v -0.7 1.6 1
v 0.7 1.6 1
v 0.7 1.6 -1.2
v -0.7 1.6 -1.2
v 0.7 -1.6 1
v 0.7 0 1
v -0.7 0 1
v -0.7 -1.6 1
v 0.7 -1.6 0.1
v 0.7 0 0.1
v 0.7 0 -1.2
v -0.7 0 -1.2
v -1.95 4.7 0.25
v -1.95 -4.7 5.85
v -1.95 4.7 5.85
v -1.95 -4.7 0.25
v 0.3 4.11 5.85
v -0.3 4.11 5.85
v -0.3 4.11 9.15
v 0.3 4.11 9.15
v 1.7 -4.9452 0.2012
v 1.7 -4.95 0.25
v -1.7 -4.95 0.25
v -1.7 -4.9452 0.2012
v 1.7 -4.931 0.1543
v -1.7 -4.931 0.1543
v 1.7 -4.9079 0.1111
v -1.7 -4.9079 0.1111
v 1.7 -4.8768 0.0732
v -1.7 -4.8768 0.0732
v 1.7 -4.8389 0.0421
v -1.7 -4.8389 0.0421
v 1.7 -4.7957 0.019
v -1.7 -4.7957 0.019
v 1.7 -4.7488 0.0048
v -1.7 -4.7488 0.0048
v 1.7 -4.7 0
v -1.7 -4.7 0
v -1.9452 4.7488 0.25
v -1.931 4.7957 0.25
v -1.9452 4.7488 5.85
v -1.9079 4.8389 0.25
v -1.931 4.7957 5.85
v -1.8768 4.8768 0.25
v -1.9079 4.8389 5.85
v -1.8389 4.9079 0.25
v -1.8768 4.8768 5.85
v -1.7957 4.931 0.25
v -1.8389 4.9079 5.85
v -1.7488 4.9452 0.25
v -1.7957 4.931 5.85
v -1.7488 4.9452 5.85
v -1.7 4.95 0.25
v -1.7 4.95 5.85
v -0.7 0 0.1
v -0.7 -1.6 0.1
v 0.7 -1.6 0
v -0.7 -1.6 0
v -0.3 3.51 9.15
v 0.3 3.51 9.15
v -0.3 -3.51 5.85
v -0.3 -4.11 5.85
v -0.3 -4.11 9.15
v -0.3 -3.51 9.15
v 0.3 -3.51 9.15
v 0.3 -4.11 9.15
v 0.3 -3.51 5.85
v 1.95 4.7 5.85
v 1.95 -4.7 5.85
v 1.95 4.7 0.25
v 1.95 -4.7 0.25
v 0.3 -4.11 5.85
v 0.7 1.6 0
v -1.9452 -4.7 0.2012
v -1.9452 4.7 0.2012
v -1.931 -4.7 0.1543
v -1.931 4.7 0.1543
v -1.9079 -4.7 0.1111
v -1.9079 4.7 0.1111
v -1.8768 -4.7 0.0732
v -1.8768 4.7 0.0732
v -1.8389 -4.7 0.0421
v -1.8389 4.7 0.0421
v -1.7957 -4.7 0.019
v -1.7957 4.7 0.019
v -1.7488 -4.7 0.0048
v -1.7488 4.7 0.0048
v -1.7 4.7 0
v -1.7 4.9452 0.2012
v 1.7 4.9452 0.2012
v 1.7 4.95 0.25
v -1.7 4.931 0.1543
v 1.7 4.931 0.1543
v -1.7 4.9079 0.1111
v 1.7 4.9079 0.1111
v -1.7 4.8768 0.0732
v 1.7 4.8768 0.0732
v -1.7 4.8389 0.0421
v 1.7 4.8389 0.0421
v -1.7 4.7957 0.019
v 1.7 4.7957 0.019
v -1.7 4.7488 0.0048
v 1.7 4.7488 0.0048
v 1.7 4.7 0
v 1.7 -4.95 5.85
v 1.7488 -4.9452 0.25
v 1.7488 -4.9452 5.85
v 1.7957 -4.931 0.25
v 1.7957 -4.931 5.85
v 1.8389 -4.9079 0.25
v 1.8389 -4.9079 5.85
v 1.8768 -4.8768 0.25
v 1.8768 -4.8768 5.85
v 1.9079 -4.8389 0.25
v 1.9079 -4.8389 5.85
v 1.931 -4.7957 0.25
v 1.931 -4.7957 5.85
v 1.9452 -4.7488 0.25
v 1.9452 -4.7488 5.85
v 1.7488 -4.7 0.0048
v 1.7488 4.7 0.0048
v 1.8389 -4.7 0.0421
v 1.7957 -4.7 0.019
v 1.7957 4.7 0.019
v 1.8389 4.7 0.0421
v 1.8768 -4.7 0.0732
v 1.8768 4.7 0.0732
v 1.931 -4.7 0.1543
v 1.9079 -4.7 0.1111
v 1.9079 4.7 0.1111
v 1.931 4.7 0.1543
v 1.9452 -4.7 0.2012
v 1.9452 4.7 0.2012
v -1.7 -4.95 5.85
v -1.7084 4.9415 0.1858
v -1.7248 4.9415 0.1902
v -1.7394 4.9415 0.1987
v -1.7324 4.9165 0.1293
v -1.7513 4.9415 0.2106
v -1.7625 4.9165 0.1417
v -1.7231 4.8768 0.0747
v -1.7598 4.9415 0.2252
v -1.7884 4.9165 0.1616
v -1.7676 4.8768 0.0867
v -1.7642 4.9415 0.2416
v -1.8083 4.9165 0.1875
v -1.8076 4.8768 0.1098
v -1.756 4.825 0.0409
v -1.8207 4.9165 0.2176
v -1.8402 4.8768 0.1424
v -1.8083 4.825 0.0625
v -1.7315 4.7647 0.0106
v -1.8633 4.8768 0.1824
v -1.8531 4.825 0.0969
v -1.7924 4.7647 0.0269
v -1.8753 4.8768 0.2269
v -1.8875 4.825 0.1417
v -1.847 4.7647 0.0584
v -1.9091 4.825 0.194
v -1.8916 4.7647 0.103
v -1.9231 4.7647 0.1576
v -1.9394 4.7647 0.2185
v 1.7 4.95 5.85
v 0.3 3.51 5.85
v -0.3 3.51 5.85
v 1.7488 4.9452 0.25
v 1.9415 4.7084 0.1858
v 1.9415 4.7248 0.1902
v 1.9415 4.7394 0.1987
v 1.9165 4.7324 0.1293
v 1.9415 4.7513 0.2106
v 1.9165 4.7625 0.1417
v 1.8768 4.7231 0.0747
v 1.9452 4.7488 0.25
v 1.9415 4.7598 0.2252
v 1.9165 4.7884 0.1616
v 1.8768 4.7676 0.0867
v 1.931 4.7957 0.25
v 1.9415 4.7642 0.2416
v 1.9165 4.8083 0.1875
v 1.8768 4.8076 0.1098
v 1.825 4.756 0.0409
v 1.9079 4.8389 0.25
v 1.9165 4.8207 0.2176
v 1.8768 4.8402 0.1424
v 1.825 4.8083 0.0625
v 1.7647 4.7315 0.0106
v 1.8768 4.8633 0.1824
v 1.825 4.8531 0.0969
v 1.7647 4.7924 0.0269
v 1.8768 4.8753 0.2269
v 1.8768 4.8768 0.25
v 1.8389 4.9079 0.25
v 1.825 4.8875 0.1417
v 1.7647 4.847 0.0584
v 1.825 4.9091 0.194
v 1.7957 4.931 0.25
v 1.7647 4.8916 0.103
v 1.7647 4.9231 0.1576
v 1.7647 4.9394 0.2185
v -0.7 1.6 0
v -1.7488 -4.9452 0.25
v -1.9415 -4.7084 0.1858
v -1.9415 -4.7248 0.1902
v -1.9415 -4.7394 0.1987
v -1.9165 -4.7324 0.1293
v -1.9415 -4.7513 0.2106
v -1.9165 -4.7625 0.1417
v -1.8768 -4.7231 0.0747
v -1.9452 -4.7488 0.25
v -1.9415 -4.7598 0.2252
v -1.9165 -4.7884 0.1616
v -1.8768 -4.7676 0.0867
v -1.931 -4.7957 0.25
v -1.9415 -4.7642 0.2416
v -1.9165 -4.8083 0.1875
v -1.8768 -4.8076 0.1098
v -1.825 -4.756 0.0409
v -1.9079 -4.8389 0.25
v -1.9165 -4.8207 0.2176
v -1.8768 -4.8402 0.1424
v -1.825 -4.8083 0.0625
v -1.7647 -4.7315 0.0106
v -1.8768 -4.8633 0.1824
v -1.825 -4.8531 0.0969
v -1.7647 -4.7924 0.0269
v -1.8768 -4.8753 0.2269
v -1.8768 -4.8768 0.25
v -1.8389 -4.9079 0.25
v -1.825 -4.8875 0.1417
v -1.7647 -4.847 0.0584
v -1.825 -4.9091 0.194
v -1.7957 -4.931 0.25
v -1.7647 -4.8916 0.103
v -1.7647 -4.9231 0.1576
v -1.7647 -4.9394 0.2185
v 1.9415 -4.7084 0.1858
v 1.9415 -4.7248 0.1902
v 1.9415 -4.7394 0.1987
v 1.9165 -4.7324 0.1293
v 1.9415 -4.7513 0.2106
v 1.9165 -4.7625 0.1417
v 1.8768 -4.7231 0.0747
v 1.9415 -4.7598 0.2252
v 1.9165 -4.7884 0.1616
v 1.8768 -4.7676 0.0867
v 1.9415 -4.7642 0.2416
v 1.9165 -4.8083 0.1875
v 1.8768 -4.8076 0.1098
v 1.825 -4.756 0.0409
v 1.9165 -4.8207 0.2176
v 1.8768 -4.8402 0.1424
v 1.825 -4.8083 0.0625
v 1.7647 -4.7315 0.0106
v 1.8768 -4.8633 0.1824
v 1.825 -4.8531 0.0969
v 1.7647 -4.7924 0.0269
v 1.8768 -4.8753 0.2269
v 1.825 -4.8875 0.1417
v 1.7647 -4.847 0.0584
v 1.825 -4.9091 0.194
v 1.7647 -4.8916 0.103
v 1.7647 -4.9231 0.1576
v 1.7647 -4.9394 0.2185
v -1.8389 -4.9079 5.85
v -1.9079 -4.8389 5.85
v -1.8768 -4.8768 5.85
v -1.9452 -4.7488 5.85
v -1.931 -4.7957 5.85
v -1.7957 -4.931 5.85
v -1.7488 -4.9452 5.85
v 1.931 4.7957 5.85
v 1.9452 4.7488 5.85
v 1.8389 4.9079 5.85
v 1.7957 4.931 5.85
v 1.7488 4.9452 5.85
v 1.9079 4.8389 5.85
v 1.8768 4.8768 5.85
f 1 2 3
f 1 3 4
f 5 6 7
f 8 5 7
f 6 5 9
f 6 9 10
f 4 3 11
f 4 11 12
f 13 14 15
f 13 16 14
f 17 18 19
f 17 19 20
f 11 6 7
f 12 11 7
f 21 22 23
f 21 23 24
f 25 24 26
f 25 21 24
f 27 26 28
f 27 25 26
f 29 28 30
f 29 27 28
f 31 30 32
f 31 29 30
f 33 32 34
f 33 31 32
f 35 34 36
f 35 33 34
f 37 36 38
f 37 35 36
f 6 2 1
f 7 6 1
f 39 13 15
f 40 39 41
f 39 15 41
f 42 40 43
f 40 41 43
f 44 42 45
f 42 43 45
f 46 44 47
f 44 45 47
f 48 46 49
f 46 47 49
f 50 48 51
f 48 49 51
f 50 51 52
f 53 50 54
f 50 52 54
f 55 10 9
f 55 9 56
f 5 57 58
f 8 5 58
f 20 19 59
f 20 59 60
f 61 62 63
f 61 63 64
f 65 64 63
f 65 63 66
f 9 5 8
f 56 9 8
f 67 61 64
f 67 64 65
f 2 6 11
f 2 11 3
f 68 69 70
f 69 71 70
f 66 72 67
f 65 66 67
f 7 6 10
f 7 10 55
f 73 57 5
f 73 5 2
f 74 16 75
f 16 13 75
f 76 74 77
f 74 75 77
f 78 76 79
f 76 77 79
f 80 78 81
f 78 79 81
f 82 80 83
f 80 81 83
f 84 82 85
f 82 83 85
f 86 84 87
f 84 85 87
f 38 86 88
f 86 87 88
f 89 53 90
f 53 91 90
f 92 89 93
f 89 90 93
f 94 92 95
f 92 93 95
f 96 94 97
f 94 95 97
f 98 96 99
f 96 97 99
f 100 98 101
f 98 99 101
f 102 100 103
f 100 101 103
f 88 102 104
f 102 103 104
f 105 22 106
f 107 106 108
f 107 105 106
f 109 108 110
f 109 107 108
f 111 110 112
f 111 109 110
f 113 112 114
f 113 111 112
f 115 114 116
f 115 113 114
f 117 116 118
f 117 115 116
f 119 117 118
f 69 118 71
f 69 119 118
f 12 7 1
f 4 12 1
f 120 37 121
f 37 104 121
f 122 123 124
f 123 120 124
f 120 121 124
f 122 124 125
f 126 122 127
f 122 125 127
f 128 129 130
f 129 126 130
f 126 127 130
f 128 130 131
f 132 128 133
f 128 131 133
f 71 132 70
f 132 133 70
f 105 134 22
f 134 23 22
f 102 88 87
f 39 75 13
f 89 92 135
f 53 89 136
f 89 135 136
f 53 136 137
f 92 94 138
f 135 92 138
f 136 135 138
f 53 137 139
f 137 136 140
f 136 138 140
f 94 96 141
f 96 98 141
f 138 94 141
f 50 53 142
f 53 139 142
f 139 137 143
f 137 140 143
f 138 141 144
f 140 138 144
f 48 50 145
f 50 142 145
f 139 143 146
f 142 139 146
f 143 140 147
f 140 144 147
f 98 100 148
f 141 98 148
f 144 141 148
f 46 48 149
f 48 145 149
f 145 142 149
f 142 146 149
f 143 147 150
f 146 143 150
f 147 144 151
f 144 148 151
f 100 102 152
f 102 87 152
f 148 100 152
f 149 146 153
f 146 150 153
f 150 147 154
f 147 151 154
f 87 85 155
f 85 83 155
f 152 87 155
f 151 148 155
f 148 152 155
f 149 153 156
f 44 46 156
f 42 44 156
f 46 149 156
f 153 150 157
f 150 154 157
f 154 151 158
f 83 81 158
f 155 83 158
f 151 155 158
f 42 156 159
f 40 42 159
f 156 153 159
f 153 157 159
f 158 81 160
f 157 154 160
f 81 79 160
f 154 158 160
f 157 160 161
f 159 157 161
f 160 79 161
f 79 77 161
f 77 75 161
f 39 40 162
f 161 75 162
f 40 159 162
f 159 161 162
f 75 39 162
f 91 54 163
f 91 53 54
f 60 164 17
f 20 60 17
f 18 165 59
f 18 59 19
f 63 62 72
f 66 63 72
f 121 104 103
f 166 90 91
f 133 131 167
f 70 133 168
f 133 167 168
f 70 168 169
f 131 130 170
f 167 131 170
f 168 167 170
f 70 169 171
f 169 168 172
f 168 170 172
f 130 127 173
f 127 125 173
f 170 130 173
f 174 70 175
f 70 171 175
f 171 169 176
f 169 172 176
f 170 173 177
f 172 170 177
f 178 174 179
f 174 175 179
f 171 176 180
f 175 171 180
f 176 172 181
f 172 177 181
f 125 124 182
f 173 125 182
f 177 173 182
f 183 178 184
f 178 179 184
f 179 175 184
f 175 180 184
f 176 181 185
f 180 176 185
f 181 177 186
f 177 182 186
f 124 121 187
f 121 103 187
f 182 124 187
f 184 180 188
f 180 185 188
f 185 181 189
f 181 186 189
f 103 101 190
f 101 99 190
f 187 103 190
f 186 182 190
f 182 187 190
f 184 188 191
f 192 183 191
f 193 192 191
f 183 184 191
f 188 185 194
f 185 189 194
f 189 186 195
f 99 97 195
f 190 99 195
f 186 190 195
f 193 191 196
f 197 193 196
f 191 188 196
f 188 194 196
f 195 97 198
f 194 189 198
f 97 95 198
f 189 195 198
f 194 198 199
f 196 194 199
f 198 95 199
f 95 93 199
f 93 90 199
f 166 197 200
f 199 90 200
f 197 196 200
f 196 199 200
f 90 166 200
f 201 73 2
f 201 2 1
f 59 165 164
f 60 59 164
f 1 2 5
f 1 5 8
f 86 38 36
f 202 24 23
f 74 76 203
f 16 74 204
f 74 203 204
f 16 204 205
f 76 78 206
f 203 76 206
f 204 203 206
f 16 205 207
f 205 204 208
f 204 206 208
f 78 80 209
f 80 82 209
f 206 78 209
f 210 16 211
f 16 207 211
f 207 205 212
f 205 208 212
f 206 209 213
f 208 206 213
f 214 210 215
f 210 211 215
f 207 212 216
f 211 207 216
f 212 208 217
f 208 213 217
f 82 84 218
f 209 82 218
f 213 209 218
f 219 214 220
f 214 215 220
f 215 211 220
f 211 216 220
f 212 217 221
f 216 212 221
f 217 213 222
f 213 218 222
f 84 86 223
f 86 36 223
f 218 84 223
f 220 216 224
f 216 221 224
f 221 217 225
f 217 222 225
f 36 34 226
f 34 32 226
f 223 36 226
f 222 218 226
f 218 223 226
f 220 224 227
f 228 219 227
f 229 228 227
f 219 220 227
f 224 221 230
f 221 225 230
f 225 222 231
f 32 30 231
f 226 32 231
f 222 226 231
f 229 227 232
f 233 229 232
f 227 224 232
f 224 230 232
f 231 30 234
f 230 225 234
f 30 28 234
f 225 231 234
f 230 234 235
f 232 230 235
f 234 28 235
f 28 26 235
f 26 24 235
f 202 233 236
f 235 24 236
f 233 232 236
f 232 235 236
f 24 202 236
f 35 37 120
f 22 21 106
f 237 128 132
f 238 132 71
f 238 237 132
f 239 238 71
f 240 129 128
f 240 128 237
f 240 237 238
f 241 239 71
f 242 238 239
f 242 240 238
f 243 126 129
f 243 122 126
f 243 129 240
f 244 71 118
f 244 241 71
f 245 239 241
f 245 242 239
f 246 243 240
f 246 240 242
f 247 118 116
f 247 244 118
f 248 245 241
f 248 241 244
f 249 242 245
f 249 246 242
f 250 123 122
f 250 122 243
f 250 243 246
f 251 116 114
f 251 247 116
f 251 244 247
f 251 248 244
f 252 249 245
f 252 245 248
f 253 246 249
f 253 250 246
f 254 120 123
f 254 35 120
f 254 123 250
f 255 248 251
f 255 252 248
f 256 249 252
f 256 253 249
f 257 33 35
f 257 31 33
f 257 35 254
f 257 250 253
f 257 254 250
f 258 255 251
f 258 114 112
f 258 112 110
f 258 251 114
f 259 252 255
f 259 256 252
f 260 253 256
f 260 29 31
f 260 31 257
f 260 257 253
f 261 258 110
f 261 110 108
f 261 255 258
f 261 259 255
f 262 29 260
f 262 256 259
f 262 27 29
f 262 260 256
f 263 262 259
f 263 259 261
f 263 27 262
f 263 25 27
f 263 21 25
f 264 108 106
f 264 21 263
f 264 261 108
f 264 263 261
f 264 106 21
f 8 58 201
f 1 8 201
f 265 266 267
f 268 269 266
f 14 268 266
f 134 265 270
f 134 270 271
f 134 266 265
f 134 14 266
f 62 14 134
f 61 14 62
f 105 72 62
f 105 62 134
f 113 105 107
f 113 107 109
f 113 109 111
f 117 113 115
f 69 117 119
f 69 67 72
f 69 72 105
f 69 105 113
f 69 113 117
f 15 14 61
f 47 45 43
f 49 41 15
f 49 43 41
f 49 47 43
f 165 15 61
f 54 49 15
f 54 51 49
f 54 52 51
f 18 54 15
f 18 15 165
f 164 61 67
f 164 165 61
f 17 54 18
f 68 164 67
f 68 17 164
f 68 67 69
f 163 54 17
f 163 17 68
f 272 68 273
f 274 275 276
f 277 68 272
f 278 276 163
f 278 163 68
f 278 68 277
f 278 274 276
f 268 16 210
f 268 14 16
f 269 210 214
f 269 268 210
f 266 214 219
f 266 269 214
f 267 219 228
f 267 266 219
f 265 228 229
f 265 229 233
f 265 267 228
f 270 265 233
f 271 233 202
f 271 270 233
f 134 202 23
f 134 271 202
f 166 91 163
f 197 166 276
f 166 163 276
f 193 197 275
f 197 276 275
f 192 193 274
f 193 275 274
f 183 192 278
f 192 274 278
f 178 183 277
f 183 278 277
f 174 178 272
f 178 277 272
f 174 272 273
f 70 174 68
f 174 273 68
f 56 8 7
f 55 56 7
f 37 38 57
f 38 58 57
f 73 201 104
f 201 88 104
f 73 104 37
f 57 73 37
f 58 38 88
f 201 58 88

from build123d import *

# Parameters (mm, degrees)
IZIM1_W                     = 3.9
IZIM1_H                     = 9.9
Y_KSEKLIK_EKSTR_ZYON1_DEPTH = 5.85
IZIM3_W                     = 1.4
IZIM3_H                     = 3.2
KES_EKSTR_ZYON1_DEPTH       = 1
IZIM4_W                     = 1.4
IZIM4_H                     = 1.6
Y_KSEKLIK_EKSTR_ZYON2_DEPTH = 2.2
IZIM5_W                     = 1.4
IZIM5_H                     = 1.6
Y_KSEKLIK_EKSTR_ZYON3_DEPTH = 0.9
RADYUS1_R                   = 0.25
IZIM6_W                     = 0.6
IZIM6_H                     = 0.6
Y_KSEKLIK_EKSTR_ZYON4_DEPTH = 3.3


with BuildPart() as part:
    # Çizim1 → Yükseklik-Ekstrüzyon1 (new body)
    with BuildSketch(Plane.XY):
        Rectangle(IZIM1_W, IZIM1_H)
    extrude(amount=Y_KSEKLIK_EKSTR_ZYON1_DEPTH)

    # Çizim3 → Kes-Ekstrüzyon1 (cut)
    with BuildSketch(Plane(origin=(0, 0, 0), x_dir=(-1, 0, 0), z_dir=(0, 0, -1))):
        Rectangle(IZIM3_W, IZIM3_H)
    extrude(amount=-KES_EKSTR_ZYON1_DEPTH, mode=Mode.SUBTRACT)

    # Radyus1
    radyus1_edges = [part.edges().sort_by_distance(p)[0] for p in [
        (0, -4.95, 0),
        (-1.95, 0, 0),
        (0, 4.95, 0),
        (1.95, 0, 0),
        (1.95, -4.95, 2.925),
        (-1.95, -4.95, 2.925),
        (-1.95, 4.95, 2.925),
        (1.95, 4.95, 2.925),
    ]]
    fillet(radyus1_edges, radius=RADYUS1_R)

    # Çizim6 → Yükseklik-Ekstrüzyon4 (add)
    with BuildSketch(Plane.XY.offset(5.85)):
        with Locations((0, 3.81)):
            Rectangle(IZIM6_W, IZIM6_H)
        with Locations((0, -3.81)):
            Rectangle(IZIM6_W, IZIM6_H)
    extrude(amount=Y_KSEKLIK_EKSTR_ZYON4_DEPTH)


with BuildPart() as body_2:
    # Çizim4 → Yükseklik-Ekstrüzyon2 (new body)
    with BuildSketch(Plane(origin=(0, 0, 1), x_dir=(-1, 0, 0), z_dir=(0, 0, -1))):
        with Locations((0, 0.8)):
            Rectangle(IZIM4_W, IZIM4_H)
    extrude(amount=Y_KSEKLIK_EKSTR_ZYON2_DEPTH)


with BuildPart() as body_3:
    # Çizim5 → Yükseklik-Ekstrüzyon3 (new body)
    with BuildSketch(Plane(origin=(0, 0, 1), x_dir=(-1, 0, 0), z_dir=(0, 0, -1))):
        with Locations((0, -0.8)):
            Rectangle(IZIM5_W, IZIM5_H)
    extrude(amount=Y_KSEKLIK_EKSTR_ZYON3_DEPTH)


solid = Compound([part.part, body_2.part, body_3.part])
